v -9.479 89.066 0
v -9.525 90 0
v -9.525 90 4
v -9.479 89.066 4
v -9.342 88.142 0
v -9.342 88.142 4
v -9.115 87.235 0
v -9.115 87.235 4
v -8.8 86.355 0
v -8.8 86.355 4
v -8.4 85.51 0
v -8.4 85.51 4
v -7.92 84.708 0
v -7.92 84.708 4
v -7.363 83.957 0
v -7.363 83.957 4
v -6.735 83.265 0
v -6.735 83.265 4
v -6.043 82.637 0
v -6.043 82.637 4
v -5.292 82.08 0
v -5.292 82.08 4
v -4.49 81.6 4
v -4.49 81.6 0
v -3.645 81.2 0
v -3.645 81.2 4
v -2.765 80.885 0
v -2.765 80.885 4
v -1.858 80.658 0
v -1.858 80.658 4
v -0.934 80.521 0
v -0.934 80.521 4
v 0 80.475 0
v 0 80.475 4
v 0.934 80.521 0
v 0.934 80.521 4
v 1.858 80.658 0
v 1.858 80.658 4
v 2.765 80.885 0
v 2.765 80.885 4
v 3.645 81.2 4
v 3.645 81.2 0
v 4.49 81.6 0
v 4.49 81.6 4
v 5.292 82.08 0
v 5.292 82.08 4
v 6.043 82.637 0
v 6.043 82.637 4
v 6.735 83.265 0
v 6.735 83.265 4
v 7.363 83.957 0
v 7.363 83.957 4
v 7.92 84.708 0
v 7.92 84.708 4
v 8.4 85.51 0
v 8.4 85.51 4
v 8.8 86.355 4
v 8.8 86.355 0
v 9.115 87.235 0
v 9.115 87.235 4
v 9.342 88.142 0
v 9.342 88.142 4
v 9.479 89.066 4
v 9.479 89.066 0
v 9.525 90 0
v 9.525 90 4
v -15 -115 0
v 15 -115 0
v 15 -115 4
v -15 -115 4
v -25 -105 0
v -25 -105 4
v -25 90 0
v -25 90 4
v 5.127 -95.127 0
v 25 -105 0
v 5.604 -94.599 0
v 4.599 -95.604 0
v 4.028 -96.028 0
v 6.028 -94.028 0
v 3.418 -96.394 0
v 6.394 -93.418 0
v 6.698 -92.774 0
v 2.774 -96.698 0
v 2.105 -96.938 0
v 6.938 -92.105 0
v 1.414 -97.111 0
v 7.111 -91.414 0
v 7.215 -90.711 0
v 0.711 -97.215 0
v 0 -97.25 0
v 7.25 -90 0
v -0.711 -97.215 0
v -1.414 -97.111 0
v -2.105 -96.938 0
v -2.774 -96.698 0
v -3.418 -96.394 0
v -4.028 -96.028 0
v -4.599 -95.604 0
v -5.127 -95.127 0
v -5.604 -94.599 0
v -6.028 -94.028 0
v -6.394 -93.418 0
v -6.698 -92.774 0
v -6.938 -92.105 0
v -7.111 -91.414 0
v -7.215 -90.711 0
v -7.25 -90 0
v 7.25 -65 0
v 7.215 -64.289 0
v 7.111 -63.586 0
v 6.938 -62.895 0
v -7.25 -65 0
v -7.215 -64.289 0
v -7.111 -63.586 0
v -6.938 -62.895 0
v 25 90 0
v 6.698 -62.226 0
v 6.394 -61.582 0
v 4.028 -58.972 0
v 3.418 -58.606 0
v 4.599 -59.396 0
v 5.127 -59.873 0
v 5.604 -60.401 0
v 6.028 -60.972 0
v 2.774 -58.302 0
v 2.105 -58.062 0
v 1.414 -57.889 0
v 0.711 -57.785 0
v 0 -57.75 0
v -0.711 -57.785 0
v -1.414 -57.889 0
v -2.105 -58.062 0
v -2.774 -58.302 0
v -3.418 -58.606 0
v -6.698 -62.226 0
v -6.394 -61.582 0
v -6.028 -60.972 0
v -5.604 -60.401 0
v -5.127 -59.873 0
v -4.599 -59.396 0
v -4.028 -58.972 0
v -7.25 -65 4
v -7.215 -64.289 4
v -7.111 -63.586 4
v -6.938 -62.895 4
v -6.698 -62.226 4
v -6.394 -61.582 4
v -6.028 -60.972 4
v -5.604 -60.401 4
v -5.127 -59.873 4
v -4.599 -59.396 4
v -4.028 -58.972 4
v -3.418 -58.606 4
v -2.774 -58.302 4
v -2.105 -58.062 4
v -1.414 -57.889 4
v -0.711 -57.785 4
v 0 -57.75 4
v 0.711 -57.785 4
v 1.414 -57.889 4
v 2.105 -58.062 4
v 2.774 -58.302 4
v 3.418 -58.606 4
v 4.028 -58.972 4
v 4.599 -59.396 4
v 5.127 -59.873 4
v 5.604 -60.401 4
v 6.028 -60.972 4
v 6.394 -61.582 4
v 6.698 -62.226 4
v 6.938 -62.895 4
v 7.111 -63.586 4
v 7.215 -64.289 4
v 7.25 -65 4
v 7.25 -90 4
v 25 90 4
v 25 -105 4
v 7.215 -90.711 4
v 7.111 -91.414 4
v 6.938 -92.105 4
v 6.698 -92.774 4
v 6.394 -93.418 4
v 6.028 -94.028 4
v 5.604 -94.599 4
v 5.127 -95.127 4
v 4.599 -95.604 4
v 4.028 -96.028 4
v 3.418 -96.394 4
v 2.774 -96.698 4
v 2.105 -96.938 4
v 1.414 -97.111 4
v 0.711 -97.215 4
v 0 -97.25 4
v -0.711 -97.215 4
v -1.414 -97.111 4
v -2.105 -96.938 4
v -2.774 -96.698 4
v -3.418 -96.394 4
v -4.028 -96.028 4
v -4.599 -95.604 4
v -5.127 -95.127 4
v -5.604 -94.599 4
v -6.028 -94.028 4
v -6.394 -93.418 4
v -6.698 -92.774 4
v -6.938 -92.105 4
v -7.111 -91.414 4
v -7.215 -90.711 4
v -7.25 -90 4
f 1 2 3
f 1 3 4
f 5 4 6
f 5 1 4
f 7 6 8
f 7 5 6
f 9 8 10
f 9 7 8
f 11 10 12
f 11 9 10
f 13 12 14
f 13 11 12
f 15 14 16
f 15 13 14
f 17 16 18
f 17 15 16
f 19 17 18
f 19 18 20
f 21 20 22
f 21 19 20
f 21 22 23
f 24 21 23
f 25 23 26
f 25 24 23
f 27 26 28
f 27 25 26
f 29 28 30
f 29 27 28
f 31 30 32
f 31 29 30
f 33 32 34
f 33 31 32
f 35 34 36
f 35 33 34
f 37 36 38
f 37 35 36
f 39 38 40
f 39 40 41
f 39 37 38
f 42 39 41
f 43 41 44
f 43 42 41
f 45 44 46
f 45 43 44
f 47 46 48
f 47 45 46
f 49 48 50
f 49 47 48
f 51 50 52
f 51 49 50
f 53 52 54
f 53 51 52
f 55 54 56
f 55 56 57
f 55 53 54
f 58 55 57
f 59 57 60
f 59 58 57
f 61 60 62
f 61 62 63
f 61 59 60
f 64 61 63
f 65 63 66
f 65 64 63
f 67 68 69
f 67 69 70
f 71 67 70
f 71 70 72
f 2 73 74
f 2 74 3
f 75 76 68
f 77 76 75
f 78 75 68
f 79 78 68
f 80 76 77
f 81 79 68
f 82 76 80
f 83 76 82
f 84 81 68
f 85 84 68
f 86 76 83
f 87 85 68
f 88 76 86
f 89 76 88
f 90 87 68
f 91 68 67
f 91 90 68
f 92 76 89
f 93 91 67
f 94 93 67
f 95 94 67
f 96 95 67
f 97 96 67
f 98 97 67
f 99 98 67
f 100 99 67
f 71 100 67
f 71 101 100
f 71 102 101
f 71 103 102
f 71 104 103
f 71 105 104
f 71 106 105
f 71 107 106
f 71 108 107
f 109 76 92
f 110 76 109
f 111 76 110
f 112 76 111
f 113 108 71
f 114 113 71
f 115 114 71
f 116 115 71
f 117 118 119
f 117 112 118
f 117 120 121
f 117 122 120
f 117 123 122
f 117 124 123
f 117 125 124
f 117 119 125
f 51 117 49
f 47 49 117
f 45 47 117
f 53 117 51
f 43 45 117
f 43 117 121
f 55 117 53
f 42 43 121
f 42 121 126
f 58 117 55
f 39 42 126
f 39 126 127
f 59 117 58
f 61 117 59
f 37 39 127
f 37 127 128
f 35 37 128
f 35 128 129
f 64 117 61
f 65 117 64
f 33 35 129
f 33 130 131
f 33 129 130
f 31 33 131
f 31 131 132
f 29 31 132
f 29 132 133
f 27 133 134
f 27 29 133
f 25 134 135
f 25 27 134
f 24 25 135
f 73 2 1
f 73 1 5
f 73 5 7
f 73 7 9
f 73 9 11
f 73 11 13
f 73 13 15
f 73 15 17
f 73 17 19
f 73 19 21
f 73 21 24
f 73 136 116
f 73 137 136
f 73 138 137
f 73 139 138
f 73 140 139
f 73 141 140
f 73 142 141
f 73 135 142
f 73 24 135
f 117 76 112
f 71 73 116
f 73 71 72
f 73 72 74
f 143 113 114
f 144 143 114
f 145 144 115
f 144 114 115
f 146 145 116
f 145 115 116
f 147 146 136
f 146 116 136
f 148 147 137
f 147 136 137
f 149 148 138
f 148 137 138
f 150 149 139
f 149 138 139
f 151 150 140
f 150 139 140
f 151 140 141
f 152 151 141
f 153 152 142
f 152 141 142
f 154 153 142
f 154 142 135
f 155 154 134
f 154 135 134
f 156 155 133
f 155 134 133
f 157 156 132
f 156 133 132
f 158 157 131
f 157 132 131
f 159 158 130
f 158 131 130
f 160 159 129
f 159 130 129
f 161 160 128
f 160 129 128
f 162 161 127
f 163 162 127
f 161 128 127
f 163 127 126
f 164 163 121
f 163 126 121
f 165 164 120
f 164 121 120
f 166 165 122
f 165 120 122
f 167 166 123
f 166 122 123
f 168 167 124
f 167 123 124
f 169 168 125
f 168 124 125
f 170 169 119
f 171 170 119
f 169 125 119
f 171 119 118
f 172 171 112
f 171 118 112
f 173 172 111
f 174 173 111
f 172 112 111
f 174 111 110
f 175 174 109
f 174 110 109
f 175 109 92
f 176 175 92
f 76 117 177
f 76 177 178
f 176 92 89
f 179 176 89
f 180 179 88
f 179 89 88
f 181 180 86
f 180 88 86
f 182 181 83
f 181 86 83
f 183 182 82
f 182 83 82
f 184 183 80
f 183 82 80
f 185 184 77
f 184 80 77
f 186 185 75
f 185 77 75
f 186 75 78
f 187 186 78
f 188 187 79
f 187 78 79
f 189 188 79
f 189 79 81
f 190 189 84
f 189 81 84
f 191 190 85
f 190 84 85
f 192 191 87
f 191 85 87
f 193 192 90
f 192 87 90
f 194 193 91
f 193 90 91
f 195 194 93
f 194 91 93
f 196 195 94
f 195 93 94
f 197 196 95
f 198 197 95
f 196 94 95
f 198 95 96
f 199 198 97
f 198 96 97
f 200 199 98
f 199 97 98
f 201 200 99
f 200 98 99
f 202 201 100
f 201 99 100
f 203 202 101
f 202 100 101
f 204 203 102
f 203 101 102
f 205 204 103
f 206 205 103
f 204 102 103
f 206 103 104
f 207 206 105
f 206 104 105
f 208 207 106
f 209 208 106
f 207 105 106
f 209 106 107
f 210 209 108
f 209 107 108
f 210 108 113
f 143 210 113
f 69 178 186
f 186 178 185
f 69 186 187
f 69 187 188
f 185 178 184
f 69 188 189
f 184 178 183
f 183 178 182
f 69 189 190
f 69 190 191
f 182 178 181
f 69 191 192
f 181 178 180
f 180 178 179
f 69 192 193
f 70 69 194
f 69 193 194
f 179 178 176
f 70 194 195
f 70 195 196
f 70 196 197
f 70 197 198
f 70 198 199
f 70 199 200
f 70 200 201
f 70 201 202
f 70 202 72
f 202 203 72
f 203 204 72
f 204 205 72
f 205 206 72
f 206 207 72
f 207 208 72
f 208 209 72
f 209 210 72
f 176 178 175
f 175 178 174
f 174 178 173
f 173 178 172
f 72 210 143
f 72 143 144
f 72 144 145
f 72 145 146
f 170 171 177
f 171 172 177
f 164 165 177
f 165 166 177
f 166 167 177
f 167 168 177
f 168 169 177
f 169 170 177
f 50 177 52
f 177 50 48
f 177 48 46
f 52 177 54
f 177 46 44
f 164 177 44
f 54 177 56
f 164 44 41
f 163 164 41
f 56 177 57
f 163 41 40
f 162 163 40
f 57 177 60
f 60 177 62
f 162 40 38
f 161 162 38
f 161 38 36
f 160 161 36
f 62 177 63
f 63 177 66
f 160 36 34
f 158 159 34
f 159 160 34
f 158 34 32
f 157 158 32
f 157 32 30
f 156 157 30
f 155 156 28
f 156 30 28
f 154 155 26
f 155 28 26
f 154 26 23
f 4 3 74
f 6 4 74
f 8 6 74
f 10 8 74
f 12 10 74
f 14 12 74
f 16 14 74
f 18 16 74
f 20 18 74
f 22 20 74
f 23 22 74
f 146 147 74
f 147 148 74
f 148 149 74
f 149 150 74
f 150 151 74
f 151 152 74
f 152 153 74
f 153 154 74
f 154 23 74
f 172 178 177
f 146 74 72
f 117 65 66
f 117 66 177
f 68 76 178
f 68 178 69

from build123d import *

# Parameters (mm, degrees)
BOSS_EXTRUDE1_DEPTH = 4


with BuildPart() as part:
    # Sketch1 → Boss-Extrude1 (new body)
    with BuildSketch(Plane.XY):
        with BuildLine():
            Line((-25, -65), (-25, 90))
            Line((-25, 90), (-9.525, 90))
            ThreePointArc((-9.525, 90), (0, 80.475), (9.525, 90))
            Line((9.525, 90), (25, 90))
            Line((25, 90), (25, -65))
            Line((25, -65), (25, -105))
            Line((25, -105), (15, -115))
            Line((15, -115), (-15, -115))
            Line((-15, -115), (-25, -105))
            Line((-25, -105), (-25, -65))
        make_face()
        with BuildLine():
            Line((-7.25, -90), (-7.25, -65))
            ThreePointArc((-7.25, -65), (0, -57.75), (7.25, -65))
            Line((7.25, -65), (7.25, -90))
            ThreePointArc((7.25, -90), (0, -97.25), (-7.25, -90))
        make_face(mode=Mode.SUBTRACT)
    extrude(amount=BOSS_EXTRUDE1_DEPTH)


solid = part.part
